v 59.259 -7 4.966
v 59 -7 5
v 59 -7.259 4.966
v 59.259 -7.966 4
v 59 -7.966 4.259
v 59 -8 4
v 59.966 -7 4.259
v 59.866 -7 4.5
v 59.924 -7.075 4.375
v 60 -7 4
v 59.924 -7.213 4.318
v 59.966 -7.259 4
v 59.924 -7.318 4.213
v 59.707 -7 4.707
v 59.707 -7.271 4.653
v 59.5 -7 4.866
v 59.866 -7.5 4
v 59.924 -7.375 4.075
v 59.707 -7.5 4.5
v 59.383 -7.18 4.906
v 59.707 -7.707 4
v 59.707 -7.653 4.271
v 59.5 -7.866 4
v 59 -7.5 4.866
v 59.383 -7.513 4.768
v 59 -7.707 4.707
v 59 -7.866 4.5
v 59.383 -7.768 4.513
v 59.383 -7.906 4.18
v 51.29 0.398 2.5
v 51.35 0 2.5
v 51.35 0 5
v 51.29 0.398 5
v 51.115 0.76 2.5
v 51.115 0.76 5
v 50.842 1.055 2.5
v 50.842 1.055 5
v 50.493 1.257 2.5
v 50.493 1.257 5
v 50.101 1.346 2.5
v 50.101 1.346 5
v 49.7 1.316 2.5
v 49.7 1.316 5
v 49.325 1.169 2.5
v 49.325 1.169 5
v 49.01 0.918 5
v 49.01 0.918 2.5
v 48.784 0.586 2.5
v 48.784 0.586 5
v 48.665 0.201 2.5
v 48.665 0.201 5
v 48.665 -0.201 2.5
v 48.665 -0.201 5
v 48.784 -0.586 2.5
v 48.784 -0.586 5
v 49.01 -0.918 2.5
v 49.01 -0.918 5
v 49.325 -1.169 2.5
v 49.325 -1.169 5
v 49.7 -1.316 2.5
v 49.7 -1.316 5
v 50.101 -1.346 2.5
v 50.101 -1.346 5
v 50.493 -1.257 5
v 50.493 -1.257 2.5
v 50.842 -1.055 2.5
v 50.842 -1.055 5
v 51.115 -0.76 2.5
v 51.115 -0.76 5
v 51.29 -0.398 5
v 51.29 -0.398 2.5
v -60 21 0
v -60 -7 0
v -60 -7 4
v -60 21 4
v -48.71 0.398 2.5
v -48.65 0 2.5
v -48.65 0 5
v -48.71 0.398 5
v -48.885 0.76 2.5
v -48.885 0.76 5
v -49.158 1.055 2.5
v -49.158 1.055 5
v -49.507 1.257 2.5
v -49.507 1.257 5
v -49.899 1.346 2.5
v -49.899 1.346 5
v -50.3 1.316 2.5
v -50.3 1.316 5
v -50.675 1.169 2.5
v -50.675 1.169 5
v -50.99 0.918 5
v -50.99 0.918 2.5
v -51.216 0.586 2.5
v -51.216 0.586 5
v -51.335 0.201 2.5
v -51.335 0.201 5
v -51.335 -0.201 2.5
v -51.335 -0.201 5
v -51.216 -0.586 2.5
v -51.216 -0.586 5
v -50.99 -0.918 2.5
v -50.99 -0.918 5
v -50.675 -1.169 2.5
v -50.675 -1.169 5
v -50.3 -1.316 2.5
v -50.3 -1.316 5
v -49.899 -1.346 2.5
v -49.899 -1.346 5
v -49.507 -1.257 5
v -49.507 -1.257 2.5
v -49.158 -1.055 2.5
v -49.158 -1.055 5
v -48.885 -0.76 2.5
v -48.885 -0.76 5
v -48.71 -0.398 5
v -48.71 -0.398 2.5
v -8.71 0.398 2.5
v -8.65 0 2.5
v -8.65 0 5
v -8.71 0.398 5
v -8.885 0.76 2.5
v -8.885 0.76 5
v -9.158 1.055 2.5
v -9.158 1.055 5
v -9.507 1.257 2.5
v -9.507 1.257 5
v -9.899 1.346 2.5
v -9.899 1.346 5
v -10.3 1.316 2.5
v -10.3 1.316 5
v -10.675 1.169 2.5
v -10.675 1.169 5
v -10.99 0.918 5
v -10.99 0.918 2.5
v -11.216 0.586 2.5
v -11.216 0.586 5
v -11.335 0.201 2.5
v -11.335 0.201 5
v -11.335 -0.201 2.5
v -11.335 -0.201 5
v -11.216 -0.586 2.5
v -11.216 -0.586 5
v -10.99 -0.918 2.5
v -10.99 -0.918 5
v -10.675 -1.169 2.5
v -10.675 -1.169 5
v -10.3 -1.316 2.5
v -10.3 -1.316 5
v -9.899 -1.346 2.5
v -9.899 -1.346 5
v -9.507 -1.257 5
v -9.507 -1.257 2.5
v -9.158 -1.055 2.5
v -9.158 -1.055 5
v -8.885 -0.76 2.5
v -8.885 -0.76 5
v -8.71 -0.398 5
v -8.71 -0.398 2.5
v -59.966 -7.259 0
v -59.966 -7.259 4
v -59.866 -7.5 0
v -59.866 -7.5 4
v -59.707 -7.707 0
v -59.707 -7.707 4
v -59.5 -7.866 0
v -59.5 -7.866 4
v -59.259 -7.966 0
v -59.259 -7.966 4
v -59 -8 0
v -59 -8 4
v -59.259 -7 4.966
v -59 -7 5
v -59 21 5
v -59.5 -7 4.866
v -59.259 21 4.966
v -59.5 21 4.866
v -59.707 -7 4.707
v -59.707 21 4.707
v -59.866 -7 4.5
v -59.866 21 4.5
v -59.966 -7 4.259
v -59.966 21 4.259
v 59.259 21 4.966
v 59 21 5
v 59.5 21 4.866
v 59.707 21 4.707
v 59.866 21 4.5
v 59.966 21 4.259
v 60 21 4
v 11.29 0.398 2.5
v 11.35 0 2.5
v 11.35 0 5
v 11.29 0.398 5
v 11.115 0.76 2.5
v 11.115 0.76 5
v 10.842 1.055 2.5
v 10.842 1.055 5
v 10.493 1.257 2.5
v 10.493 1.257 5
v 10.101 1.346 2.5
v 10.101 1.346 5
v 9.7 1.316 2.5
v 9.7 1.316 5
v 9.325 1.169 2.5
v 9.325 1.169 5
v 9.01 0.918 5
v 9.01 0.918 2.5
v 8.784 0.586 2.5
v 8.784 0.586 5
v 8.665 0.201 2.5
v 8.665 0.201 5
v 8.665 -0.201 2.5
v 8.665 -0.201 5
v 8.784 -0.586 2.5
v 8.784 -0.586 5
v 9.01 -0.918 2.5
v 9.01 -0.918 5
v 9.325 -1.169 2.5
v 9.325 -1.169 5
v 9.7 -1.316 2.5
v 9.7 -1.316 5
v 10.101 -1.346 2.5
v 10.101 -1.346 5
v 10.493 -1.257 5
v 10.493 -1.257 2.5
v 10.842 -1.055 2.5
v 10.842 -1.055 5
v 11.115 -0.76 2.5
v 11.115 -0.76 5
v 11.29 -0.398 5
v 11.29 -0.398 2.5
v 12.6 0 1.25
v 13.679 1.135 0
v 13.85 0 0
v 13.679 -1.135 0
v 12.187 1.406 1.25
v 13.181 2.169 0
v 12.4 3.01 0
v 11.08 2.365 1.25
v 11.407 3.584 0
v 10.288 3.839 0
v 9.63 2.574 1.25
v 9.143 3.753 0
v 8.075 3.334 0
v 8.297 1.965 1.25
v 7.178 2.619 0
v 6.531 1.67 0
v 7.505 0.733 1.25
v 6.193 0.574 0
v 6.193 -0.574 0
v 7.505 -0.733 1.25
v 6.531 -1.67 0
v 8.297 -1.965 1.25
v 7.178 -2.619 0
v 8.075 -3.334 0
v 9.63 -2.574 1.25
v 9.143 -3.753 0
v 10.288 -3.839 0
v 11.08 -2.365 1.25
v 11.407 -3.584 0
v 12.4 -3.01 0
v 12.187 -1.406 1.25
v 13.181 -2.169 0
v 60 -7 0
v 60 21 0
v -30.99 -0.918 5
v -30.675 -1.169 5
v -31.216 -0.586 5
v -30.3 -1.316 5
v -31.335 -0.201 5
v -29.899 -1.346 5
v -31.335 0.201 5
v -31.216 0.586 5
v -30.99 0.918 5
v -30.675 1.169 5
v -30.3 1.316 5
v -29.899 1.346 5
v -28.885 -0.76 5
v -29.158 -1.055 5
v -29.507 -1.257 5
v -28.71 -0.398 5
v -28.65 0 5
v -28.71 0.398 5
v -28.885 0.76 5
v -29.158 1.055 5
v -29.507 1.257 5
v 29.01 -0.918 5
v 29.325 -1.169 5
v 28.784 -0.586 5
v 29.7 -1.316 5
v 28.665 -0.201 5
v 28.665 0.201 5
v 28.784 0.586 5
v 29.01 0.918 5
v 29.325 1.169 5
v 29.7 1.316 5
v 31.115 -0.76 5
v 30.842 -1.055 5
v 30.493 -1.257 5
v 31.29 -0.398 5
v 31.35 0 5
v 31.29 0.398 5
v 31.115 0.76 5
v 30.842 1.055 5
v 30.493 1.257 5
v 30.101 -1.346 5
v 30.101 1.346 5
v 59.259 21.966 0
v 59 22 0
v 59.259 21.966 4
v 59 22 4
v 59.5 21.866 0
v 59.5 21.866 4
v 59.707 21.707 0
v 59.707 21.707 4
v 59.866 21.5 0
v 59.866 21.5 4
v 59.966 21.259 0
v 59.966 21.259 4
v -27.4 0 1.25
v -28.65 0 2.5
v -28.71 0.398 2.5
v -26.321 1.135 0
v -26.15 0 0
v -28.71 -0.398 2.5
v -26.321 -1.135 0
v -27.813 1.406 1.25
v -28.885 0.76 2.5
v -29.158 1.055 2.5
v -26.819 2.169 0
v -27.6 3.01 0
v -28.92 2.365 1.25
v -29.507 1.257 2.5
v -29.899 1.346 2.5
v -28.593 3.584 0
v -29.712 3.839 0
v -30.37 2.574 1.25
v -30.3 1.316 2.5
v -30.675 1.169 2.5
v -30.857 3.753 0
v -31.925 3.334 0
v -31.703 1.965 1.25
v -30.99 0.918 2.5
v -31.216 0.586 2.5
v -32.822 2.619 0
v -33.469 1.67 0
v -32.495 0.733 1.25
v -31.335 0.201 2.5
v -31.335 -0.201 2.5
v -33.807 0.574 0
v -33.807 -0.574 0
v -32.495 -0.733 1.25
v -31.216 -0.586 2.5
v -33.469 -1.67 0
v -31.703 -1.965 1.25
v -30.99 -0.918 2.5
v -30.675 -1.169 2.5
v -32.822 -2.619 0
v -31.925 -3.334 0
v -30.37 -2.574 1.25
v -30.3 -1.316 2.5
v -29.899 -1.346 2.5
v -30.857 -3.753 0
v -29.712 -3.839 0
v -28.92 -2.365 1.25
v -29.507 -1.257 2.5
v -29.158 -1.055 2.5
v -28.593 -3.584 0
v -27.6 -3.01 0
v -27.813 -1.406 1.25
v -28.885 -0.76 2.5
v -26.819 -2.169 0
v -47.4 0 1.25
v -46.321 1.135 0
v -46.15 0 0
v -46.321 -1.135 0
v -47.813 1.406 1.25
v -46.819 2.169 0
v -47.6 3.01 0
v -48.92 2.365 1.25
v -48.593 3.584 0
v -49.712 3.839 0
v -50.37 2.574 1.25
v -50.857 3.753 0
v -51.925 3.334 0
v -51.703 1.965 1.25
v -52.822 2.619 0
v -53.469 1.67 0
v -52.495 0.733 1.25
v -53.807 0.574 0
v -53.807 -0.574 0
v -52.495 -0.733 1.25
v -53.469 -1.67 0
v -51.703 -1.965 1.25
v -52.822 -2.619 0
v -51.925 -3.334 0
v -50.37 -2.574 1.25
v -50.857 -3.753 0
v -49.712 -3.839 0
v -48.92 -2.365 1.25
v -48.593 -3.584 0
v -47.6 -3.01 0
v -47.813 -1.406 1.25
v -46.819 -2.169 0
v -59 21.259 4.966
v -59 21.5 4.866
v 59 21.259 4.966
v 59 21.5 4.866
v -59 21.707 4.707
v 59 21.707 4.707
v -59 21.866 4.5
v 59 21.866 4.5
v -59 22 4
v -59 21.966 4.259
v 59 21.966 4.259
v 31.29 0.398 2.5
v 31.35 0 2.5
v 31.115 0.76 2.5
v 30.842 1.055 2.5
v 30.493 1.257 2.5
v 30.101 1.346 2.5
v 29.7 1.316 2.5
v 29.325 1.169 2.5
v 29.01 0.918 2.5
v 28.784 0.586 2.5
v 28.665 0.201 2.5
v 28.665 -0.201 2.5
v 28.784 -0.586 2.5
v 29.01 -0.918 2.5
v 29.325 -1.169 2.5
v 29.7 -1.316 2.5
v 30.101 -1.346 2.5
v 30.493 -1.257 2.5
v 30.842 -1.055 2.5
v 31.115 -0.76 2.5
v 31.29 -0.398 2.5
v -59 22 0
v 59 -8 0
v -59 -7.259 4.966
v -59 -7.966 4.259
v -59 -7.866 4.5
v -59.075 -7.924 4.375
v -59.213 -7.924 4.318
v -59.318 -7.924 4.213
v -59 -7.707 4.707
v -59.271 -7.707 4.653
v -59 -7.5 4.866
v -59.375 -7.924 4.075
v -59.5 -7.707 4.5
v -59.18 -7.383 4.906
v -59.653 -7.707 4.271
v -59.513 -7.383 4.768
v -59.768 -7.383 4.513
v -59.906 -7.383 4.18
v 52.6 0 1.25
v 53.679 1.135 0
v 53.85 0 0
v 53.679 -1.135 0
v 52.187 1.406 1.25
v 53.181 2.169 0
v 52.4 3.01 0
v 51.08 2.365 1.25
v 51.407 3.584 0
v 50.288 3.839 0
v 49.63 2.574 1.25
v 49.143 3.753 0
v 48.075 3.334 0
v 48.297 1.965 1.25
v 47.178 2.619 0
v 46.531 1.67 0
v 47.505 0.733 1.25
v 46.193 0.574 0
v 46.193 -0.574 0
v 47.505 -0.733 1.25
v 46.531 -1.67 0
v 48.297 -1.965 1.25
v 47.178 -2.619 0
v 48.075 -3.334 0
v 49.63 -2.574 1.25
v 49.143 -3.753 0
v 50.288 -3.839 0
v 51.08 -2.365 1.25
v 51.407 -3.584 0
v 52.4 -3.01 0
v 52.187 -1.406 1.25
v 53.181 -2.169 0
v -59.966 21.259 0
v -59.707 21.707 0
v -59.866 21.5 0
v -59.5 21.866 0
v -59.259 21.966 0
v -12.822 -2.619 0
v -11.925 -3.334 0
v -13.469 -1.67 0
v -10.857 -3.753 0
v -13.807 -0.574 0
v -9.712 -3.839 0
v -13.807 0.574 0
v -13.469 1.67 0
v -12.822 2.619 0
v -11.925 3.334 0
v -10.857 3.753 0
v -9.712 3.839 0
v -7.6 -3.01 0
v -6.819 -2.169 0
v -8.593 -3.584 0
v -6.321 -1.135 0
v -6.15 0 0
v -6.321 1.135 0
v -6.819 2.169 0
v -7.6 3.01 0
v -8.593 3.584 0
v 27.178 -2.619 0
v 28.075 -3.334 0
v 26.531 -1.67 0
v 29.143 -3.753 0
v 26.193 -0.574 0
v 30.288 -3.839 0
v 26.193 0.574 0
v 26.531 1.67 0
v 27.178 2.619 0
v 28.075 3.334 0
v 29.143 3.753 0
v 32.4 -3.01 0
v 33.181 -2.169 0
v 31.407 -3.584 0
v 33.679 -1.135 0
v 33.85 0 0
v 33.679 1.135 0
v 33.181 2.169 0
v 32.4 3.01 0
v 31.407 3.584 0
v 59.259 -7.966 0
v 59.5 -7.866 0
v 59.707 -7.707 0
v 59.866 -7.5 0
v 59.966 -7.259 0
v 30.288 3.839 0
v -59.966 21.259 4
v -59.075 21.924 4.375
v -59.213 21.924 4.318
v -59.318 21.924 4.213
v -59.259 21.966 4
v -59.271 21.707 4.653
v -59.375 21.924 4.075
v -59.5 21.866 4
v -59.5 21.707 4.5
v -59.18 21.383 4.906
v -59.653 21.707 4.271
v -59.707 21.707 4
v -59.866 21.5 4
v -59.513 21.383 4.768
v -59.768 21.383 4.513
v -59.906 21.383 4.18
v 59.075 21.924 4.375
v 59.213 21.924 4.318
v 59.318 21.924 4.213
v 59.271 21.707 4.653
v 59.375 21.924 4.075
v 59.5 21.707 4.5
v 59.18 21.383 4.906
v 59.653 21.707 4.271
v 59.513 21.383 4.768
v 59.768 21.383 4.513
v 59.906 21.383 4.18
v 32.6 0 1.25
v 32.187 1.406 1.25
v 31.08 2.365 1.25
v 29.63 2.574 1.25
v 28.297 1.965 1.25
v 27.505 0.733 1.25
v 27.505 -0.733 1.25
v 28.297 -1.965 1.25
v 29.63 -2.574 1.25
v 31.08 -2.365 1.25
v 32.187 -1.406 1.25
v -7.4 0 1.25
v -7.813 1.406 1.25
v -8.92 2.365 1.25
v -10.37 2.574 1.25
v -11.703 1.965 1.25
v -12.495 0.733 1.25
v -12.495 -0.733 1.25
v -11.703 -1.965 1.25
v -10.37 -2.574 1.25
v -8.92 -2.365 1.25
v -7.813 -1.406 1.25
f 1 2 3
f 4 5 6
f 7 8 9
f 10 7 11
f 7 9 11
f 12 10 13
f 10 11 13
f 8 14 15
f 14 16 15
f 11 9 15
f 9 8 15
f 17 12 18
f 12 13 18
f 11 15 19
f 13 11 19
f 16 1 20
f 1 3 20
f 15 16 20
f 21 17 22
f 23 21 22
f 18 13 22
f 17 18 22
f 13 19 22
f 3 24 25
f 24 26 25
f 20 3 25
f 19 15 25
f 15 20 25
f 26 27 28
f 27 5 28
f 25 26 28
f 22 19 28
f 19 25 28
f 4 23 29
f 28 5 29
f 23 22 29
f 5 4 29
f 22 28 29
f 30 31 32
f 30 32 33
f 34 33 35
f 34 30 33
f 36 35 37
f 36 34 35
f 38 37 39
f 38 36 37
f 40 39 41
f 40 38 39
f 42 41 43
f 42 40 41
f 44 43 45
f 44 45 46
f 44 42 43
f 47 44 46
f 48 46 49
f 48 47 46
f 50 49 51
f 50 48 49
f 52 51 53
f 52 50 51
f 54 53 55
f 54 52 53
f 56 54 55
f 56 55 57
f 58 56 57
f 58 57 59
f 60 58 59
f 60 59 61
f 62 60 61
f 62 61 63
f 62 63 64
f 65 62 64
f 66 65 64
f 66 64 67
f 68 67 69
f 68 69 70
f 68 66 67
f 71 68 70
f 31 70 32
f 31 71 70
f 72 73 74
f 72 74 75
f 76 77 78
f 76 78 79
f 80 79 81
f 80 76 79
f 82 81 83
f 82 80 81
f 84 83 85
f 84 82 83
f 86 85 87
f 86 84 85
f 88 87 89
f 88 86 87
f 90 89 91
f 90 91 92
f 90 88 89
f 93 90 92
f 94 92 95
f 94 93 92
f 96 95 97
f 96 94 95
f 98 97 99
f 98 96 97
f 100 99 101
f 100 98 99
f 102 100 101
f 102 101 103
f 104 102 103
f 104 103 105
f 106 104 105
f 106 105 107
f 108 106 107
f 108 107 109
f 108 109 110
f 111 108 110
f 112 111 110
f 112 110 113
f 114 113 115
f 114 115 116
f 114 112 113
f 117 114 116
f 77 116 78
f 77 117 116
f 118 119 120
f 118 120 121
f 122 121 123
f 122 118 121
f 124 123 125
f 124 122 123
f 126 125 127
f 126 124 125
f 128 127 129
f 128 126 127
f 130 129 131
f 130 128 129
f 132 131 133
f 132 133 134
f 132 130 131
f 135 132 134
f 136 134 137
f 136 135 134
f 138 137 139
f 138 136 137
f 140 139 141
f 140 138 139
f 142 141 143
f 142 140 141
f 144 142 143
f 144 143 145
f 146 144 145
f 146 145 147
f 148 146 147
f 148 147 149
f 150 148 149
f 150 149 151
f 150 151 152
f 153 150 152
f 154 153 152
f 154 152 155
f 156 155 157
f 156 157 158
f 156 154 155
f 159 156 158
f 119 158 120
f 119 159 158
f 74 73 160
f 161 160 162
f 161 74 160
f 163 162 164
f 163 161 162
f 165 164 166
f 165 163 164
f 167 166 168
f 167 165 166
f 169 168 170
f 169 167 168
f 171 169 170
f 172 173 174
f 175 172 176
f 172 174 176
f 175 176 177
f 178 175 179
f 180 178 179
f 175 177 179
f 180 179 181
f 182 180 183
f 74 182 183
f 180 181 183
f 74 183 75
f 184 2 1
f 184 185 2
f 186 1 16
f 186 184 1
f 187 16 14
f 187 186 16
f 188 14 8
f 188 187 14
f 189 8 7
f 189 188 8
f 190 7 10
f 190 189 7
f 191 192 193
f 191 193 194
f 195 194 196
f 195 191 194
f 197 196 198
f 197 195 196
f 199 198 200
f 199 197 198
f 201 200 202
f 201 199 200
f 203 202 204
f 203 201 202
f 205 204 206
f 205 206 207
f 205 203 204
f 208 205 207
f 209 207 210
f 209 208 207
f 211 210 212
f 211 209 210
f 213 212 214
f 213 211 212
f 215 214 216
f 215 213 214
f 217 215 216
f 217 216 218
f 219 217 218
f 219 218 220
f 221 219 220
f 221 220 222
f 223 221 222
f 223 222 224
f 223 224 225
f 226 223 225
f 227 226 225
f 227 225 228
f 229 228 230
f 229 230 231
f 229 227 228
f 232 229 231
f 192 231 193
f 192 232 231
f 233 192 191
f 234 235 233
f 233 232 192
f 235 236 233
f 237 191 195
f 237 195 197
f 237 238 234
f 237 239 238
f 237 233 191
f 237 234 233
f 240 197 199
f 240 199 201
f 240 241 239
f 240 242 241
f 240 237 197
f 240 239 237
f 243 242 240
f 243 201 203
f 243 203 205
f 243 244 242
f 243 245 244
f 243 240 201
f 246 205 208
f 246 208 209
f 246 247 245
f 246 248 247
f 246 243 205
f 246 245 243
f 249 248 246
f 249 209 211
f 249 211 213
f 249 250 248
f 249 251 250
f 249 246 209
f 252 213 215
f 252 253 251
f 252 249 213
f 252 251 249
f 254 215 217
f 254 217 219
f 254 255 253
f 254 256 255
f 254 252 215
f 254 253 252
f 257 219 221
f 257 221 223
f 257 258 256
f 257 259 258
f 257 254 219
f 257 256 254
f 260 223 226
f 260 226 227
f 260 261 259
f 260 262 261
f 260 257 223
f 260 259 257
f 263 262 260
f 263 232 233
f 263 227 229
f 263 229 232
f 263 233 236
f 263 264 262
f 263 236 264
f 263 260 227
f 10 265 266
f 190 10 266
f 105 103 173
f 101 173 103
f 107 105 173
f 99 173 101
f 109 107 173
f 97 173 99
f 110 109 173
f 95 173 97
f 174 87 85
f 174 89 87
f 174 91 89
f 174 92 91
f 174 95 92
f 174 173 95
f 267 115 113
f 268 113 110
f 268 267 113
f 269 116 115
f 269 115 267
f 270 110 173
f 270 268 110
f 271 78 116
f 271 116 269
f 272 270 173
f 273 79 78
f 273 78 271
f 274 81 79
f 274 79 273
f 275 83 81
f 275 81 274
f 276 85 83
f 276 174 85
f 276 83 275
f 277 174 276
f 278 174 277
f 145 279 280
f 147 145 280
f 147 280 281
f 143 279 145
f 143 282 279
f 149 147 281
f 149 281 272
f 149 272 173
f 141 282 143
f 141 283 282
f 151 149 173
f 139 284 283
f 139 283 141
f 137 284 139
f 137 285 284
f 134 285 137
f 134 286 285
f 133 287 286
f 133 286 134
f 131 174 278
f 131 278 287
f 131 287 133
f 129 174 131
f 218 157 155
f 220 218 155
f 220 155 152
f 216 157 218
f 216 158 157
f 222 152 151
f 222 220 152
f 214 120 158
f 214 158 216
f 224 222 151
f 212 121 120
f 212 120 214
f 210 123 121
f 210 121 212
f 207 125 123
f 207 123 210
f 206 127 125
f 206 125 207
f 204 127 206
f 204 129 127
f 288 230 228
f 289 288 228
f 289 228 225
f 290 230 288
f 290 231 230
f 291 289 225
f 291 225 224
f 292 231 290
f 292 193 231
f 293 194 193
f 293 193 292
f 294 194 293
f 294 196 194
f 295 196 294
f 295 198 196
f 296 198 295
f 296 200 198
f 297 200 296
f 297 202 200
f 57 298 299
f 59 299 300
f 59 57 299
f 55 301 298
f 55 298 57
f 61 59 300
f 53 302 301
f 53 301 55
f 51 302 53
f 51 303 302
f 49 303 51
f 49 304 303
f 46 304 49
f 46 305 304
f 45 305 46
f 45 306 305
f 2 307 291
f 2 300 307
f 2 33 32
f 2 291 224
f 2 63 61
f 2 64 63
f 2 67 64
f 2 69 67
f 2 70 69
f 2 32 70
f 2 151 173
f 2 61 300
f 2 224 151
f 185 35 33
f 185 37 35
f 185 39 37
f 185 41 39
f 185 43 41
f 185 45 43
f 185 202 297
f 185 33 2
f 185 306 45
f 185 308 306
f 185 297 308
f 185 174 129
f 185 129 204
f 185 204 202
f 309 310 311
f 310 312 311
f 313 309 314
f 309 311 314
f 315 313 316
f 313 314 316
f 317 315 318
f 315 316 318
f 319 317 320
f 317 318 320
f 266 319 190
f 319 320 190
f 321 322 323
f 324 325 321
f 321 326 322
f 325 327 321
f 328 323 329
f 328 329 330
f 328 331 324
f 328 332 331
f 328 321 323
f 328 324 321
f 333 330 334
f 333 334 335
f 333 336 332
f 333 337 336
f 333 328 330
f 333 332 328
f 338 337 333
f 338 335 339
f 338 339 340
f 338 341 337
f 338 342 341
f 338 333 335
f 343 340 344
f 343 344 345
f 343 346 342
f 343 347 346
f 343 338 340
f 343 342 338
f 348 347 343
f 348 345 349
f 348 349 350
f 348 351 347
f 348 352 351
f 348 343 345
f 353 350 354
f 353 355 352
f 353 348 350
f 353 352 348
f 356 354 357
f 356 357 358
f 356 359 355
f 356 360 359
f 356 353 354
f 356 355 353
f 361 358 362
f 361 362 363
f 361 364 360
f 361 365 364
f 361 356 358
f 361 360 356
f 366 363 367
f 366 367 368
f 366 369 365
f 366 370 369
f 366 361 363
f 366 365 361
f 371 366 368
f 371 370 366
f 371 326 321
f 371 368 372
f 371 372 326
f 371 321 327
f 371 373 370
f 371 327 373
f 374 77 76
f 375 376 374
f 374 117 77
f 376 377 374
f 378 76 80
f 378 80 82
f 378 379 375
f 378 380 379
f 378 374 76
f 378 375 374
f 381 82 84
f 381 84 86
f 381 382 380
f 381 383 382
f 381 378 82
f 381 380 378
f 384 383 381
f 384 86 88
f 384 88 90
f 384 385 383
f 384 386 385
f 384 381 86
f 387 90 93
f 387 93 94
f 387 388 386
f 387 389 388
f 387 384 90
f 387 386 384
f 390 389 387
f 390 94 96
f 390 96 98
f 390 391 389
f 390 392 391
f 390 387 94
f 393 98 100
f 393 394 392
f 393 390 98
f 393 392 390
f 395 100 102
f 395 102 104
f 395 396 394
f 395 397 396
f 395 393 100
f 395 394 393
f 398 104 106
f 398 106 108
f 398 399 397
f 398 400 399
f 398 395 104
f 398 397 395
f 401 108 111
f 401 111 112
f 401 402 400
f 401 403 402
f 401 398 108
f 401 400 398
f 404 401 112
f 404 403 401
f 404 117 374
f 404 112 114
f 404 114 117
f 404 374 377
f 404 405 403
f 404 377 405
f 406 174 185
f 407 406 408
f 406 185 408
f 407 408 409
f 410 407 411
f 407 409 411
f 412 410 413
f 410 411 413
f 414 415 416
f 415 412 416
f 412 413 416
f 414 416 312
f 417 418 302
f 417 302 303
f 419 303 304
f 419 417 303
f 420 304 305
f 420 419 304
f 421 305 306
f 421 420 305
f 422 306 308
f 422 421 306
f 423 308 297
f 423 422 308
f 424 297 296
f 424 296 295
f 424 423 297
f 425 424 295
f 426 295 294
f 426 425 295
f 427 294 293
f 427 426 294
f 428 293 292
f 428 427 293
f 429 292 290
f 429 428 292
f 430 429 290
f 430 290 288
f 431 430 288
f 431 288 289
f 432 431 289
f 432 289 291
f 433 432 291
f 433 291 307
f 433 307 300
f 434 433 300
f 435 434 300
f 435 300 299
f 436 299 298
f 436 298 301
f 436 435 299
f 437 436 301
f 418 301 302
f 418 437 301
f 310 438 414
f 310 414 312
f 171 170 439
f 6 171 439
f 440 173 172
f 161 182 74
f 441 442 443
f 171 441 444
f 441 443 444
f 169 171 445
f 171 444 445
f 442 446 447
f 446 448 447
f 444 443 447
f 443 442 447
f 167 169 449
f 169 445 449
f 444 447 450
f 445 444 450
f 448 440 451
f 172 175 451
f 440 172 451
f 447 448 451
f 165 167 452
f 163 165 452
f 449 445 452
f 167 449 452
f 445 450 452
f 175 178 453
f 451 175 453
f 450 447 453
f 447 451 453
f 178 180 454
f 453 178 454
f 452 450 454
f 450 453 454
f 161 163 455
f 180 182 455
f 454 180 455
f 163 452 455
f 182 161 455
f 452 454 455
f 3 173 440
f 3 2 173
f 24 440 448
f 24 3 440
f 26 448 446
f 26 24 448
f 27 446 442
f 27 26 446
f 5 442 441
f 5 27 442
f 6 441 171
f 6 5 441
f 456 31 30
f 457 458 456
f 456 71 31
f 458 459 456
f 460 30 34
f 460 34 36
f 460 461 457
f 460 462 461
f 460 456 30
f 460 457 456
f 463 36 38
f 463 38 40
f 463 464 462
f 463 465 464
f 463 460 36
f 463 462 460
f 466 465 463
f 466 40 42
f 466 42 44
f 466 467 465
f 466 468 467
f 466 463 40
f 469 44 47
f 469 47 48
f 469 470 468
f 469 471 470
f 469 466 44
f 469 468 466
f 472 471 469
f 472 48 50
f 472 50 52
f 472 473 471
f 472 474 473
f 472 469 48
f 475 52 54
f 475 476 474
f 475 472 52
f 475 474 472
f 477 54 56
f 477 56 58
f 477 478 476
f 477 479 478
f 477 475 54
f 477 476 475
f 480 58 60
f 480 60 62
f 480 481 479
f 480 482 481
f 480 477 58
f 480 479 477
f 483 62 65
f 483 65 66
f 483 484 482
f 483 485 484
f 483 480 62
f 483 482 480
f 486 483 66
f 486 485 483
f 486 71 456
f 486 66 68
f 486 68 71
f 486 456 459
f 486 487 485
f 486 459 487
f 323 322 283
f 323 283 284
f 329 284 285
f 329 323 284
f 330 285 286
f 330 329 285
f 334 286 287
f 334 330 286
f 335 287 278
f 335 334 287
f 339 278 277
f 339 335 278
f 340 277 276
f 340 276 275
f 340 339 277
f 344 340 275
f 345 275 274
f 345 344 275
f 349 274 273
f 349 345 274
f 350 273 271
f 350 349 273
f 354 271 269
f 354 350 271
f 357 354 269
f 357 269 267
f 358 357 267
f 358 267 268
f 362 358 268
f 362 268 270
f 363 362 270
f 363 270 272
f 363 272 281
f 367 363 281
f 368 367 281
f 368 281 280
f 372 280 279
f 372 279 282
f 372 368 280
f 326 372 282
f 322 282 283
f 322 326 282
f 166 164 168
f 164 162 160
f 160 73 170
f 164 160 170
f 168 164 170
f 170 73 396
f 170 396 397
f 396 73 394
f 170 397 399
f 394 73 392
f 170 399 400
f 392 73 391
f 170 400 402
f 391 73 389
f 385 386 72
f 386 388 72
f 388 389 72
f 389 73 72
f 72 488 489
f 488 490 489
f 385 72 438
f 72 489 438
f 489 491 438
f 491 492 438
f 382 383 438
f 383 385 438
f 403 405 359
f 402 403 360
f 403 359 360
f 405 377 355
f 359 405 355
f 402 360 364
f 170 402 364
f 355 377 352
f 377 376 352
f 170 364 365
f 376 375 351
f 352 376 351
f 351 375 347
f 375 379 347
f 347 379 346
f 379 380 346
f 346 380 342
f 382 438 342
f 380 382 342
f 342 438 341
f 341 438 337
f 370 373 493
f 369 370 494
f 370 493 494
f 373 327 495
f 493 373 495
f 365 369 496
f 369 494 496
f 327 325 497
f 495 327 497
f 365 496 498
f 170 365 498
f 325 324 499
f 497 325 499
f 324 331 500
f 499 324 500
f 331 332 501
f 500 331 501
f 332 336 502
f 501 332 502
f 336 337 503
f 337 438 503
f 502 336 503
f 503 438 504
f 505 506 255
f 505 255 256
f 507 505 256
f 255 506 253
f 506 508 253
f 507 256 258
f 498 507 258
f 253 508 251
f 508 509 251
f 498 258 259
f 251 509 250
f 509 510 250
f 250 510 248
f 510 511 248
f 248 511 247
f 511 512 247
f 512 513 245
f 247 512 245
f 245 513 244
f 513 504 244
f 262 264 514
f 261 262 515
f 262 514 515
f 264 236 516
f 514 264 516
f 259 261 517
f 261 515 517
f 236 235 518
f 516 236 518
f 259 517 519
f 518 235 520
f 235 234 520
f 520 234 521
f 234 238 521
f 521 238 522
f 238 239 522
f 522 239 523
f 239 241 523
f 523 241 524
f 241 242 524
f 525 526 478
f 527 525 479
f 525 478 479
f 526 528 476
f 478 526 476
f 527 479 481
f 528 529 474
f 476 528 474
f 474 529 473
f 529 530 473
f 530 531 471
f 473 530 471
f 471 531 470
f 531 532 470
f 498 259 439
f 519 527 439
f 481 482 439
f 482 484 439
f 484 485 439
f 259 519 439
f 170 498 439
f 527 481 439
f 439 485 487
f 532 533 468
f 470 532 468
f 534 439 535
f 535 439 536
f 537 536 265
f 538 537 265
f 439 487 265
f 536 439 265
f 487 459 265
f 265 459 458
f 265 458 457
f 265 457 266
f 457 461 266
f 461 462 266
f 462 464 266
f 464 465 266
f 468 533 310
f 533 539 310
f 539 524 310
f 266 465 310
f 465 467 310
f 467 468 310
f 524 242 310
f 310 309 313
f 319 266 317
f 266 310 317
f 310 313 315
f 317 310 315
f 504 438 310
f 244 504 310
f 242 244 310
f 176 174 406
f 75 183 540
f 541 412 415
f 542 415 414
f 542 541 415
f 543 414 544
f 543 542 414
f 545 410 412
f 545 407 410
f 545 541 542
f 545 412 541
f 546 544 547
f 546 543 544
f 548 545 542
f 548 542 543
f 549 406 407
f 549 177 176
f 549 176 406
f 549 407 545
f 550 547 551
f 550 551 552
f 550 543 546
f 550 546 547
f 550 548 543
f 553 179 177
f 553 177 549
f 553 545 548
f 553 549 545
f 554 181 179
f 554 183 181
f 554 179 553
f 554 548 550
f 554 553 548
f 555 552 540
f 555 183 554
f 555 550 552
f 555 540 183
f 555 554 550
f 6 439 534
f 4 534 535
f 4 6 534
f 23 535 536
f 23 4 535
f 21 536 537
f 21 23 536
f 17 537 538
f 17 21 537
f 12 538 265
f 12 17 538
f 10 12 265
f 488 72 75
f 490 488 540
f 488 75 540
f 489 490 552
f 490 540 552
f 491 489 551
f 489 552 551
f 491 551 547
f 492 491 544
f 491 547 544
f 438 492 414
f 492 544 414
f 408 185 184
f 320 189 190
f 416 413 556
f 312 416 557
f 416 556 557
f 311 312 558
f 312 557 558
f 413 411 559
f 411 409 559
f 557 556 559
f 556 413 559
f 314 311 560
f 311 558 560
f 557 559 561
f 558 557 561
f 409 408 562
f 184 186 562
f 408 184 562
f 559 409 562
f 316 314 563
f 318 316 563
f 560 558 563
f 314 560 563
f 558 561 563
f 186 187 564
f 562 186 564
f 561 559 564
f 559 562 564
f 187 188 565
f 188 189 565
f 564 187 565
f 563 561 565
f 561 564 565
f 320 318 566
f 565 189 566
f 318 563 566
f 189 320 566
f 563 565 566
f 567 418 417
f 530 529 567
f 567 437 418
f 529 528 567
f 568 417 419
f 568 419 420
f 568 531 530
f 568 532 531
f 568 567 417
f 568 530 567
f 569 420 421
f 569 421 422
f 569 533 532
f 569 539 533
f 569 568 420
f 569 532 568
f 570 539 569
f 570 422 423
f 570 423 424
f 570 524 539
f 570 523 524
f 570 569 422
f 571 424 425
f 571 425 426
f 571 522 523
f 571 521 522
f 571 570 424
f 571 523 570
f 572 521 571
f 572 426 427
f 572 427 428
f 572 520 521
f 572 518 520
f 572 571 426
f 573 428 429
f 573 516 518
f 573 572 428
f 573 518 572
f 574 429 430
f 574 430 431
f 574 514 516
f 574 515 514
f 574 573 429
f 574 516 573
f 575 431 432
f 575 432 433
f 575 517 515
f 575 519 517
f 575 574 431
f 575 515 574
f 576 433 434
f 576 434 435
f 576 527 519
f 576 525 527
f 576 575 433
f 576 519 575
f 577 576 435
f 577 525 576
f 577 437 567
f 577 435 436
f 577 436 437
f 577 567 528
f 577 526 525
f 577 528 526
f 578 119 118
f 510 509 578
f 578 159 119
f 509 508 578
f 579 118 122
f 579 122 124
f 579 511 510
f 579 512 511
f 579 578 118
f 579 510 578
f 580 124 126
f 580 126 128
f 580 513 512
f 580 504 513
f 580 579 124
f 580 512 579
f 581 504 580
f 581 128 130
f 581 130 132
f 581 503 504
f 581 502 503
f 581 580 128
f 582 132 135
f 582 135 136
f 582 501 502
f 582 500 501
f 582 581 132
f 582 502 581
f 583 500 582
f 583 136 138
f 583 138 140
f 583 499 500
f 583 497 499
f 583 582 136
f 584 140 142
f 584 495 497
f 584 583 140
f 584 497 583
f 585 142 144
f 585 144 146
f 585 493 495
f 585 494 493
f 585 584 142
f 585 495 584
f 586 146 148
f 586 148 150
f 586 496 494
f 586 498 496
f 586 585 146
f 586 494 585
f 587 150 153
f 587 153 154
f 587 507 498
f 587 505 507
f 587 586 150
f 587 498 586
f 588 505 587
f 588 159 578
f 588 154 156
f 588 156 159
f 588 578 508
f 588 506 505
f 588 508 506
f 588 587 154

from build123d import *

# Parameters (mm, degrees)
F0_W     = 120
F0_H     = 30
F0_R     = 1.35
F1_DEPTH = 5
F2_SIZE  = 2.5
F3_R     = 1


with BuildPart() as f1:
    # F0 (on Top) → F1 (new body)
    with BuildSketch(Plane.XY):
        with Locations((0, 7)):
            Rectangle(F0_W, F0_H)
        with Locations((-50, 0)):
            Circle(F0_R, mode=Mode.SUBTRACT)
        with Locations((-30, 0)):
            Circle(F0_R, mode=Mode.SUBTRACT)
        with Locations((-10, 0)):
            Circle(F0_R, mode=Mode.SUBTRACT)
        with Locations((10, 0)):
            Circle(F0_R, mode=Mode.SUBTRACT)
        with Locations((30, 0)):
            Circle(F0_R, mode=Mode.SUBTRACT)
        with Locations((50, 0)):
            Circle(F0_R, mode=Mode.SUBTRACT)
    extrude(amount=F1_DEPTH)

    # F2
    f2_edges = [f1.edges().sort_by_distance(p)[0] for p in [
        (-51.35, 0, 0),
        (-31.35, 0, 0),
        (-11.35, 0, 0),
        (8.65, 0, 0),
        (28.65, 0, 0),
        (48.65, 0, 0),
    ]]
    chamfer(f2_edges, length=F2_SIZE)

    # F3
    f3_edges = [f1.edges().sort_by_distance(p)[0] for p in [
        (-60, 7, 5),
        (0, -8, 5),
        (60, 7, 5),
        (0, 22, 5),
        (60, 22, 2.5),
        (60, -8, 2.5),
        (-60, -8, 2.5),
        (-60, 22, 2.5),
    ]]
    fillet(f3_edges, radius=F3_R)


solid = f1.part
